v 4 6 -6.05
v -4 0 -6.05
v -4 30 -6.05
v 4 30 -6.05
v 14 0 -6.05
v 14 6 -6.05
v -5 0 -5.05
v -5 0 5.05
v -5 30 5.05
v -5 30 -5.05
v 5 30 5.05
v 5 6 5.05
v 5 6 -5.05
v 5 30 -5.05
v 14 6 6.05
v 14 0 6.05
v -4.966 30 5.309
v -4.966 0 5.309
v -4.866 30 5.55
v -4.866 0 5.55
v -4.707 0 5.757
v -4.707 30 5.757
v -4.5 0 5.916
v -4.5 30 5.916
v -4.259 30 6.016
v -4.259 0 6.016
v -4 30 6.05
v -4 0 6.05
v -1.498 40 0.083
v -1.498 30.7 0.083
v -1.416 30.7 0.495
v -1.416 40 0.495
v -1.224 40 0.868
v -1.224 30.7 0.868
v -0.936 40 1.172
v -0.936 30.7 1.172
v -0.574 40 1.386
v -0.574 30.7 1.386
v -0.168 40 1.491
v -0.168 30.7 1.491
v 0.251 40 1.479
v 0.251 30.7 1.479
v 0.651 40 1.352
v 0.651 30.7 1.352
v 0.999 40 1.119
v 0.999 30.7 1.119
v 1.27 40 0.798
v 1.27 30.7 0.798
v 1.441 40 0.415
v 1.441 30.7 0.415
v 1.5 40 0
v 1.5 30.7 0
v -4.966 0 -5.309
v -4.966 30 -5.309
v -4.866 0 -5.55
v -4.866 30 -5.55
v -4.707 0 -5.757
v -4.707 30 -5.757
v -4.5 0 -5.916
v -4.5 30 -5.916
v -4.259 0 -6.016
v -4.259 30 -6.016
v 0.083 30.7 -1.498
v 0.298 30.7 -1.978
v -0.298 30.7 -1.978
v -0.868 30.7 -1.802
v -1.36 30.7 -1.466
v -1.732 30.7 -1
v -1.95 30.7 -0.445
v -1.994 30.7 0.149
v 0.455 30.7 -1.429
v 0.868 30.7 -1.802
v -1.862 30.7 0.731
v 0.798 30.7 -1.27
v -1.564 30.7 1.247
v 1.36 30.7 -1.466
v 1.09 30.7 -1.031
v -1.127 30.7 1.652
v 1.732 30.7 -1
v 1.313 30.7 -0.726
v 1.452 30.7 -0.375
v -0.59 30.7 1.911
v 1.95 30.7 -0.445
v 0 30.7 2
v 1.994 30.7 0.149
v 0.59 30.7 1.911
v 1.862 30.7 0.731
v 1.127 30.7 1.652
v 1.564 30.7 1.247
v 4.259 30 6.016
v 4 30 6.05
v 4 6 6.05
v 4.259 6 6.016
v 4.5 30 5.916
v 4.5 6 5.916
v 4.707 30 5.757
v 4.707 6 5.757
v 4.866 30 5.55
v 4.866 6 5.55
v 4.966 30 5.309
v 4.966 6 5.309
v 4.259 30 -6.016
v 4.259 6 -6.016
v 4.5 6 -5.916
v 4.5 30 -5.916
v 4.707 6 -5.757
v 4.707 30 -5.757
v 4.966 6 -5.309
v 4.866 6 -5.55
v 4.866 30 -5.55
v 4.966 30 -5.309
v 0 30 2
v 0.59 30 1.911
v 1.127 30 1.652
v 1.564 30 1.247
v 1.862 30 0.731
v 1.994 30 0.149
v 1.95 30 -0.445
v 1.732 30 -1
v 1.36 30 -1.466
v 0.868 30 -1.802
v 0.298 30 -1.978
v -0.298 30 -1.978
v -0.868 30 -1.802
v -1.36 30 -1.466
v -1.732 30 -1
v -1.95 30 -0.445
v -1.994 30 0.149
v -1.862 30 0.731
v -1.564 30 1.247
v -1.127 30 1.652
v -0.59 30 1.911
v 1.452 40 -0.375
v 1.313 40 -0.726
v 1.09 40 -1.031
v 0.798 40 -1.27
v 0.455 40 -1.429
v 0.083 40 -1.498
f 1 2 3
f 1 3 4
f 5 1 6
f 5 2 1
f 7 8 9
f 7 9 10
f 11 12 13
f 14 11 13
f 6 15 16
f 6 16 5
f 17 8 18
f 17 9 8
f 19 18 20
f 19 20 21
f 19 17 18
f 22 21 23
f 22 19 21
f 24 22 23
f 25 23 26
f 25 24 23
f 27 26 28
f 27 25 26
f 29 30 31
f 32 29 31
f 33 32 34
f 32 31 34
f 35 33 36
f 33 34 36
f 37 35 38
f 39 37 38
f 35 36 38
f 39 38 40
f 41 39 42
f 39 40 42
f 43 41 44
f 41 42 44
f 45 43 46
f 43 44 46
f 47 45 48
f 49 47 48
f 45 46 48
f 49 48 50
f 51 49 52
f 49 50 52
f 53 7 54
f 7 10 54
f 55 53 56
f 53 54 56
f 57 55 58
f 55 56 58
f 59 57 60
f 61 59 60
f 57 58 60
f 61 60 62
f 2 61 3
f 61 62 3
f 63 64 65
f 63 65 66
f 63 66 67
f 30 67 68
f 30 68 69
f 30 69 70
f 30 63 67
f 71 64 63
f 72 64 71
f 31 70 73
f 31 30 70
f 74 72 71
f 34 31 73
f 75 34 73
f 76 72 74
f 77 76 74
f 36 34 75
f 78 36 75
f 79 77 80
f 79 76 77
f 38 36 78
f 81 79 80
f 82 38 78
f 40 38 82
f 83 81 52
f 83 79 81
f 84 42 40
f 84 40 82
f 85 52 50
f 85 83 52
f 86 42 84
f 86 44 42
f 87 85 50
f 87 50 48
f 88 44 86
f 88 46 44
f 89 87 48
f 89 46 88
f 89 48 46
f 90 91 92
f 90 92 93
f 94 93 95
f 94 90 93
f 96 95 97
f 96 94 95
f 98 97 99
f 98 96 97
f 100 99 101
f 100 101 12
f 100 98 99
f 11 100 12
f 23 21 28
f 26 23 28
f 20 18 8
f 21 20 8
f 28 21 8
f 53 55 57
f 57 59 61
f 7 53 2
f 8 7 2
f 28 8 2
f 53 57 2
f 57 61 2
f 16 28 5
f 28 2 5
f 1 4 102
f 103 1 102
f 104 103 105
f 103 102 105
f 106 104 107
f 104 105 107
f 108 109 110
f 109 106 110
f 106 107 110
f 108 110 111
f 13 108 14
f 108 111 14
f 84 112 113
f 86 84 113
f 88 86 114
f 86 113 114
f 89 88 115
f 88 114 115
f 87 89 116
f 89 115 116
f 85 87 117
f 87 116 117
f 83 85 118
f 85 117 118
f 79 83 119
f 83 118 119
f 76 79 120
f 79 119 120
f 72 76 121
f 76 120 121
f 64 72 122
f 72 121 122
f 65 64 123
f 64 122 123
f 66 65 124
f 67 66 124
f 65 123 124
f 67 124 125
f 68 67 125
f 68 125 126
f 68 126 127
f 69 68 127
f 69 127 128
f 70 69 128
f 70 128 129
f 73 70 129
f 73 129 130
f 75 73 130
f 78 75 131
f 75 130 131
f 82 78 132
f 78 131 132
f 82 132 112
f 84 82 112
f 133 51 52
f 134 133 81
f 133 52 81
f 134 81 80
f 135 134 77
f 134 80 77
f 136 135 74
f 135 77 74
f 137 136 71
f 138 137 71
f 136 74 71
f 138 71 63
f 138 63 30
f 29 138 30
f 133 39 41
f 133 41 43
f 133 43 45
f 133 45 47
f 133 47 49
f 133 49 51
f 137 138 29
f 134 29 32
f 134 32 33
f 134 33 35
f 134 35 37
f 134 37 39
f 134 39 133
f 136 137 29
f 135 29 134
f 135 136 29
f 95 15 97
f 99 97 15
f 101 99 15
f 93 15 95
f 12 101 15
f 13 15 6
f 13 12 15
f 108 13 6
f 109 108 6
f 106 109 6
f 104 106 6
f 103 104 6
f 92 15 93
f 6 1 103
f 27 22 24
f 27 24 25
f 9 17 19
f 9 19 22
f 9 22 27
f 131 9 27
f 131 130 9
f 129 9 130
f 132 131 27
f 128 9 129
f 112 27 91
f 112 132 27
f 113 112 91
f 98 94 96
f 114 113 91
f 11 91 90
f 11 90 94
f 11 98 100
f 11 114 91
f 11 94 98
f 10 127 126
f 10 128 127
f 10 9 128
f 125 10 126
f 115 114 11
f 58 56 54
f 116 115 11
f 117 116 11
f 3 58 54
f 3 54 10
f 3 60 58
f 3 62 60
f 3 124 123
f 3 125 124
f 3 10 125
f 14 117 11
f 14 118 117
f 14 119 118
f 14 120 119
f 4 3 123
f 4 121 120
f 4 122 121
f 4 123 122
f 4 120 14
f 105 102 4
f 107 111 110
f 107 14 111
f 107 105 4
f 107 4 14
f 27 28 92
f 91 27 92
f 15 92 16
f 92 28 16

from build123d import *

# Parameters (mm, degrees)
SKETCH1_W           = 10
SKETCH1_H           = 12.1
BOSS_EXTRUDE1_DEPTH = 30
SKETCH2_R           = 2
BOSS_EXTRUDE2_DEPTH = 0.7
BOSS_EXTRUDE3_DEPTH = 9.3
FILLET1_R           = 1
SKETCH4_W           = 12.1
SKETCH4_H           = 6
BOSS_EXTRUDE4_DEPTH = 14


with BuildPart() as part:
    # Sketch1 → Boss-Extrude1 (new body)
    with BuildSketch(Plane(origin=(0, 0, 0), x_dir=(1, 0, 0), z_dir=(0, 1, 0))):
        Rectangle(SKETCH1_W, SKETCH1_H)
    extrude(amount=BOSS_EXTRUDE1_DEPTH)

    # Sketch2 → Boss-Extrude2 (add)
    with BuildSketch(Plane(origin=(0, 30, 0), x_dir=(1, 0, 0), z_dir=(0, 1, 0))):
        with Locations(Location((0, 0, 0), (0, 0, 270))):
            Circle(SKETCH2_R)
    extrude(amount=BOSS_EXTRUDE2_DEPTH)

    # Sketch3 → Boss-Extrude3 (add)
    with BuildSketch(Plane(origin=(0, 30.7, 0), x_dir=(1, 0, 0), z_dir=(0, 1, 0))):
        with BuildLine():
            ThreePointArc((1.5, 0), (1.08976923, 1.030729365), (0.083462634, 1.497676196))
            Line((0.083462634, 1.497676196), (-1.497676196, -0.083462634))
            ThreePointArc((-1.497676196, -0.083462634), (0.041747489, -1.499418937), (1.5, 0))
        make_face()
    extrude(amount=BOSS_EXTRUDE3_DEPTH)

    # Fillet1
    fillet1_edges = [part.edges().sort_by_distance(p)[0] for p in [
        (5, 15, 6.05),
        (-5, 15, 6.05),
        (-5, 15, -6.05),
        (5, 15, -6.05),
    ]]
    fillet(fillet1_edges, radius=FILLET1_R)

    # Sketch4 → Boss-Extrude4 (add)
    with BuildSketch(Plane(origin=(0, 0, 0), x_dir=(0, 0, -1), z_dir=(1, 0, 0))):
        with Locations((0, 3)):
            Rectangle(SKETCH4_W, SKETCH4_H)
    extrude(amount=BOSS_EXTRUDE4_DEPTH)


solid = part.part
